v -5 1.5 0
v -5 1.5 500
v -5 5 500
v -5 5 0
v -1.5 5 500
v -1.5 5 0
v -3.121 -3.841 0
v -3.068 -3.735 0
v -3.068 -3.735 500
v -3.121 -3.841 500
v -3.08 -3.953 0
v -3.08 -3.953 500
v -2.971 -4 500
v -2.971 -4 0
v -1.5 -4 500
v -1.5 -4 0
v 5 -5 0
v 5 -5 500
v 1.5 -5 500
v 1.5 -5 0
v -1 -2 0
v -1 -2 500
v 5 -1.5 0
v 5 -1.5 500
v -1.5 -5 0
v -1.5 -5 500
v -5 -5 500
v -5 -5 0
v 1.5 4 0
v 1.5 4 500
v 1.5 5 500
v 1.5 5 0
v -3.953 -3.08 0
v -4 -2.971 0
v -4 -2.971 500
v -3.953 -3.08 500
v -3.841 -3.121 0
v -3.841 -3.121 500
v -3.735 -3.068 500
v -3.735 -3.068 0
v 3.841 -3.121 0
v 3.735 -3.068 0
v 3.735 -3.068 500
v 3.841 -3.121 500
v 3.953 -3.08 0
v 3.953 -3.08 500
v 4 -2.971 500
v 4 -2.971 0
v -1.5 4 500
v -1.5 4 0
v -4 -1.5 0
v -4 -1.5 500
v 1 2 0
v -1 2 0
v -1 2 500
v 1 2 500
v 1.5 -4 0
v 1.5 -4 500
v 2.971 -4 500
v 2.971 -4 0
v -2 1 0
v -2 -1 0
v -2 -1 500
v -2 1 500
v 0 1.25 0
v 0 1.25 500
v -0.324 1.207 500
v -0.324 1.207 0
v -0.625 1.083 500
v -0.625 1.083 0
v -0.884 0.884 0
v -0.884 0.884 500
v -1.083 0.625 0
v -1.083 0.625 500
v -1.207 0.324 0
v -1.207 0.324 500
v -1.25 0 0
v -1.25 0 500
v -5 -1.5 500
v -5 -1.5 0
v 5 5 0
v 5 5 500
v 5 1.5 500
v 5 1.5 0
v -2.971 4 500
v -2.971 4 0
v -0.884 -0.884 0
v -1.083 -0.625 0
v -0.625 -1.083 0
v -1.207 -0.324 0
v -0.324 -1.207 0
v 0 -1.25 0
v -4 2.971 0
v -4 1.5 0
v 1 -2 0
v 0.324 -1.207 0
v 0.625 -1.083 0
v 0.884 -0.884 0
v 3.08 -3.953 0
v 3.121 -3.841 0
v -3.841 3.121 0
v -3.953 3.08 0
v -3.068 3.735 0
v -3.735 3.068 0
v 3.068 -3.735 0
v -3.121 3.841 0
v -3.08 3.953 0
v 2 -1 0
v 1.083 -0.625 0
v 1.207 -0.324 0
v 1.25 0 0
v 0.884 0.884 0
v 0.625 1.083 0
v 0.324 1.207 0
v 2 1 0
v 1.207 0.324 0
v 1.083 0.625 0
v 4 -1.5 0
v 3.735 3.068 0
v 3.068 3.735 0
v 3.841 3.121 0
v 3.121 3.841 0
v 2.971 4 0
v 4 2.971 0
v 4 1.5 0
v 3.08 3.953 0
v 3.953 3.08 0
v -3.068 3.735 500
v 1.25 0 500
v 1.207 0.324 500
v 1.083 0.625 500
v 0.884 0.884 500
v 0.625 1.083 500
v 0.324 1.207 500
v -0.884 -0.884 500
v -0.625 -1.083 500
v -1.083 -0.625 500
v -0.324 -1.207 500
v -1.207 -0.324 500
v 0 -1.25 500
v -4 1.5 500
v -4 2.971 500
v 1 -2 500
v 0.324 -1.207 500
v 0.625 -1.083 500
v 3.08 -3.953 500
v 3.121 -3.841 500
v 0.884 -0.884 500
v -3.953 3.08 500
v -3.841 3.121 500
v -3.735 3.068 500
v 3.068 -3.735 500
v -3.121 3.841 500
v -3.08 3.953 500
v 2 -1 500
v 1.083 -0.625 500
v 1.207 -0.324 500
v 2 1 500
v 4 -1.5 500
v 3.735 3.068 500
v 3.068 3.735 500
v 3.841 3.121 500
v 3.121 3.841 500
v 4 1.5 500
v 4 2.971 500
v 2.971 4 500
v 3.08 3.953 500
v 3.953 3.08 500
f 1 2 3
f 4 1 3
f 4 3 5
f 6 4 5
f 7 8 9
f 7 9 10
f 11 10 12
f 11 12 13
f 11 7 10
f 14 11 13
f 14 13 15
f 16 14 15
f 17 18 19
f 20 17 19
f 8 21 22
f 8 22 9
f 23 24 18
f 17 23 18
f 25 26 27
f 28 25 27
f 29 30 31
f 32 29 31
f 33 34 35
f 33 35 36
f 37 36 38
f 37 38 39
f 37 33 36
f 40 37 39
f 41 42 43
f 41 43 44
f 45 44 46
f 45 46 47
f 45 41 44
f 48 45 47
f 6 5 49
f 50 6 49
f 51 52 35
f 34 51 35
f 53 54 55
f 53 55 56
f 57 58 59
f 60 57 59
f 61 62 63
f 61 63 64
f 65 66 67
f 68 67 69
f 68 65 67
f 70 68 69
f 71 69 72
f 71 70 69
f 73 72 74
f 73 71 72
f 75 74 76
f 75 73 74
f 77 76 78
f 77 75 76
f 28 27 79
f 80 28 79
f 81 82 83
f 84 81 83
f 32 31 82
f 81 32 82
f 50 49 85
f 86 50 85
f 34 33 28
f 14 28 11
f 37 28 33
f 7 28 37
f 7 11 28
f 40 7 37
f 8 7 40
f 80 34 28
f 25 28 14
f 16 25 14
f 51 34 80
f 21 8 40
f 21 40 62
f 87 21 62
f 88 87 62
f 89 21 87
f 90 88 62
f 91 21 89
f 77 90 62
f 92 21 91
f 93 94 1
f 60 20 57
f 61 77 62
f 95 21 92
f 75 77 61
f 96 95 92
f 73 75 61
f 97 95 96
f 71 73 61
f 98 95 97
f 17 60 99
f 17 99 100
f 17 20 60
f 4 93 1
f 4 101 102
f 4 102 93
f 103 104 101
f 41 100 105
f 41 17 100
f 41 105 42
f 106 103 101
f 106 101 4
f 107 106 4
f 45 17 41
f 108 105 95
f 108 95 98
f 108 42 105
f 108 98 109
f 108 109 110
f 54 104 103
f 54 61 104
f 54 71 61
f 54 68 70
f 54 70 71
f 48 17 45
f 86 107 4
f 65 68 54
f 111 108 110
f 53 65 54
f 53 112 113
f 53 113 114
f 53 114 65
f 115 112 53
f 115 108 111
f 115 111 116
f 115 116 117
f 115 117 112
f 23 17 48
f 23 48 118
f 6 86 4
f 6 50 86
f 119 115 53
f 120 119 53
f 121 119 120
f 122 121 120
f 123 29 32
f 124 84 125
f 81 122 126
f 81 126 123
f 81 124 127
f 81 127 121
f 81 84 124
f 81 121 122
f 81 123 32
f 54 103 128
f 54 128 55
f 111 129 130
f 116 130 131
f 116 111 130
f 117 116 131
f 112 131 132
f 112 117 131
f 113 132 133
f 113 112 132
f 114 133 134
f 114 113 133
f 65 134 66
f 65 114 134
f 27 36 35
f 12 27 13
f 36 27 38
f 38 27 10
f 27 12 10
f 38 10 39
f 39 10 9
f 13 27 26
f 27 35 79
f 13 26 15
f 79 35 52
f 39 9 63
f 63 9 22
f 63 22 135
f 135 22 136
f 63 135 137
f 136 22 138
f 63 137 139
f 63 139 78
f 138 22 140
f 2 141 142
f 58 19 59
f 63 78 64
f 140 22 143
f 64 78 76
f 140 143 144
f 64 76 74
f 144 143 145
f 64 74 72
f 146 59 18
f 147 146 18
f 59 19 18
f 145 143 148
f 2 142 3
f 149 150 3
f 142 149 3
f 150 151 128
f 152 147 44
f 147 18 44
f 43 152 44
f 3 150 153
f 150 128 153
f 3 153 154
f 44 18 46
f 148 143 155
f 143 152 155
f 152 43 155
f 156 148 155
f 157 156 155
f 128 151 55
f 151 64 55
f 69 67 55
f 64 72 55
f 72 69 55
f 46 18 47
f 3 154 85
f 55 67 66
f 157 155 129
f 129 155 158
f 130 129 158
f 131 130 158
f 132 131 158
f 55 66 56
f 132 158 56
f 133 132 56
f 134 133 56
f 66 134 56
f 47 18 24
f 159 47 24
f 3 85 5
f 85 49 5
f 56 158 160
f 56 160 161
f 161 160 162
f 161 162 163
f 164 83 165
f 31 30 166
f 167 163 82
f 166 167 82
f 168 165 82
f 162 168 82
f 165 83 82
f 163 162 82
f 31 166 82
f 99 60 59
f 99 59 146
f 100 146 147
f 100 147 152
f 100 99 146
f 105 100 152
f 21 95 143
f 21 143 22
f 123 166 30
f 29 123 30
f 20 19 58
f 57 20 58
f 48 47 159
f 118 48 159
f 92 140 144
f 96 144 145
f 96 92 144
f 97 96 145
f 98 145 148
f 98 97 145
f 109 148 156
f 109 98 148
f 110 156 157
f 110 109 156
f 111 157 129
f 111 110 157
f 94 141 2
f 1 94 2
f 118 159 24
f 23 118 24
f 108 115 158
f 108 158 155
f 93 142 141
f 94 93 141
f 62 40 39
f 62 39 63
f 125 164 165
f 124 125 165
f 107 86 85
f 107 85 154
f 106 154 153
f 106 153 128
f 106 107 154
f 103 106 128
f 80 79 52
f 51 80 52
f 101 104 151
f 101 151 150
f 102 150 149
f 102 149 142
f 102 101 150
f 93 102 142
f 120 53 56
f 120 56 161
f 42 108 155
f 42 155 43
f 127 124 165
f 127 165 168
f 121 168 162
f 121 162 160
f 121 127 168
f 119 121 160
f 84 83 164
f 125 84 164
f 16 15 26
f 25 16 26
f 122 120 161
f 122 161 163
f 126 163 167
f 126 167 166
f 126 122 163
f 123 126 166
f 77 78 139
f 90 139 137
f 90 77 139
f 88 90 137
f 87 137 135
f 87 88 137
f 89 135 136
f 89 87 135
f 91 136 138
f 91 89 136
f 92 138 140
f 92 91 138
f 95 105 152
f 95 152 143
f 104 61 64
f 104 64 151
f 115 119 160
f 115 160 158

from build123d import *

# Parameters (mm, degrees)
BOSS_EXTRU_1_DEPTH           = 500
R_P_TITION_CIRCULAIRE1_COUNT = 4


with BuildPart() as part:
    # Esquisse1 → Boss.-Extru.1 (new body)
    with BuildSketch(Plane.XY):
        with BuildLine():
            Line((0, 2), (0, 1.25))
            ThreePointArc((0, 1.25), (-0.883883476, 0.883883476), (-1.25, 0))
            Line((-1.25, 0), (-2, 0))
            Line((-2, 0), (-2, 1))
            Line((-2, 1), (-3.735093334, 3.067803714))
            ThreePointArc((-3.735093334, 3.067803714), (-3.901303021, 3.112339465), (-4, 2.971385572))
            Line((-4, 2.971385572), (-4, 1.5))
            Line((-4, 1.5), (-5, 1.5))
            Line((-5, 1.5), (-5, 5))
            Line((-5, 5), (-1.5, 5))
            Line((-1.5, 5), (-1.5, 4))
            Line((-1.5, 4), (-2.971385572, 4))
            ThreePointArc((-2.971385572, 4), (-3.112339465, 3.901303021), (-3.067803714, 3.735093334))
            Line((-3.067803714, 3.735093334), (-1, 2))
            Line((-1, 2), (0, 2))
        make_face()
    boss_extru_1 = extrude(amount=BOSS_EXTRU_1_DEPTH)

    # Répétition circulaire1: Boss.-Extru.1 ×4 about axis
    r_p_tition_circulaire1_axis = Axis((0, 0, 105), (0, 0, -1))
    for i in range(1, R_P_TITION_CIRCULAIRE1_COUNT):
        add(boss_extru_1.rotate(r_p_tition_circulaire1_axis, i * 360 / R_P_TITION_CIRCULAIRE1_COUNT))


solid = part.part
